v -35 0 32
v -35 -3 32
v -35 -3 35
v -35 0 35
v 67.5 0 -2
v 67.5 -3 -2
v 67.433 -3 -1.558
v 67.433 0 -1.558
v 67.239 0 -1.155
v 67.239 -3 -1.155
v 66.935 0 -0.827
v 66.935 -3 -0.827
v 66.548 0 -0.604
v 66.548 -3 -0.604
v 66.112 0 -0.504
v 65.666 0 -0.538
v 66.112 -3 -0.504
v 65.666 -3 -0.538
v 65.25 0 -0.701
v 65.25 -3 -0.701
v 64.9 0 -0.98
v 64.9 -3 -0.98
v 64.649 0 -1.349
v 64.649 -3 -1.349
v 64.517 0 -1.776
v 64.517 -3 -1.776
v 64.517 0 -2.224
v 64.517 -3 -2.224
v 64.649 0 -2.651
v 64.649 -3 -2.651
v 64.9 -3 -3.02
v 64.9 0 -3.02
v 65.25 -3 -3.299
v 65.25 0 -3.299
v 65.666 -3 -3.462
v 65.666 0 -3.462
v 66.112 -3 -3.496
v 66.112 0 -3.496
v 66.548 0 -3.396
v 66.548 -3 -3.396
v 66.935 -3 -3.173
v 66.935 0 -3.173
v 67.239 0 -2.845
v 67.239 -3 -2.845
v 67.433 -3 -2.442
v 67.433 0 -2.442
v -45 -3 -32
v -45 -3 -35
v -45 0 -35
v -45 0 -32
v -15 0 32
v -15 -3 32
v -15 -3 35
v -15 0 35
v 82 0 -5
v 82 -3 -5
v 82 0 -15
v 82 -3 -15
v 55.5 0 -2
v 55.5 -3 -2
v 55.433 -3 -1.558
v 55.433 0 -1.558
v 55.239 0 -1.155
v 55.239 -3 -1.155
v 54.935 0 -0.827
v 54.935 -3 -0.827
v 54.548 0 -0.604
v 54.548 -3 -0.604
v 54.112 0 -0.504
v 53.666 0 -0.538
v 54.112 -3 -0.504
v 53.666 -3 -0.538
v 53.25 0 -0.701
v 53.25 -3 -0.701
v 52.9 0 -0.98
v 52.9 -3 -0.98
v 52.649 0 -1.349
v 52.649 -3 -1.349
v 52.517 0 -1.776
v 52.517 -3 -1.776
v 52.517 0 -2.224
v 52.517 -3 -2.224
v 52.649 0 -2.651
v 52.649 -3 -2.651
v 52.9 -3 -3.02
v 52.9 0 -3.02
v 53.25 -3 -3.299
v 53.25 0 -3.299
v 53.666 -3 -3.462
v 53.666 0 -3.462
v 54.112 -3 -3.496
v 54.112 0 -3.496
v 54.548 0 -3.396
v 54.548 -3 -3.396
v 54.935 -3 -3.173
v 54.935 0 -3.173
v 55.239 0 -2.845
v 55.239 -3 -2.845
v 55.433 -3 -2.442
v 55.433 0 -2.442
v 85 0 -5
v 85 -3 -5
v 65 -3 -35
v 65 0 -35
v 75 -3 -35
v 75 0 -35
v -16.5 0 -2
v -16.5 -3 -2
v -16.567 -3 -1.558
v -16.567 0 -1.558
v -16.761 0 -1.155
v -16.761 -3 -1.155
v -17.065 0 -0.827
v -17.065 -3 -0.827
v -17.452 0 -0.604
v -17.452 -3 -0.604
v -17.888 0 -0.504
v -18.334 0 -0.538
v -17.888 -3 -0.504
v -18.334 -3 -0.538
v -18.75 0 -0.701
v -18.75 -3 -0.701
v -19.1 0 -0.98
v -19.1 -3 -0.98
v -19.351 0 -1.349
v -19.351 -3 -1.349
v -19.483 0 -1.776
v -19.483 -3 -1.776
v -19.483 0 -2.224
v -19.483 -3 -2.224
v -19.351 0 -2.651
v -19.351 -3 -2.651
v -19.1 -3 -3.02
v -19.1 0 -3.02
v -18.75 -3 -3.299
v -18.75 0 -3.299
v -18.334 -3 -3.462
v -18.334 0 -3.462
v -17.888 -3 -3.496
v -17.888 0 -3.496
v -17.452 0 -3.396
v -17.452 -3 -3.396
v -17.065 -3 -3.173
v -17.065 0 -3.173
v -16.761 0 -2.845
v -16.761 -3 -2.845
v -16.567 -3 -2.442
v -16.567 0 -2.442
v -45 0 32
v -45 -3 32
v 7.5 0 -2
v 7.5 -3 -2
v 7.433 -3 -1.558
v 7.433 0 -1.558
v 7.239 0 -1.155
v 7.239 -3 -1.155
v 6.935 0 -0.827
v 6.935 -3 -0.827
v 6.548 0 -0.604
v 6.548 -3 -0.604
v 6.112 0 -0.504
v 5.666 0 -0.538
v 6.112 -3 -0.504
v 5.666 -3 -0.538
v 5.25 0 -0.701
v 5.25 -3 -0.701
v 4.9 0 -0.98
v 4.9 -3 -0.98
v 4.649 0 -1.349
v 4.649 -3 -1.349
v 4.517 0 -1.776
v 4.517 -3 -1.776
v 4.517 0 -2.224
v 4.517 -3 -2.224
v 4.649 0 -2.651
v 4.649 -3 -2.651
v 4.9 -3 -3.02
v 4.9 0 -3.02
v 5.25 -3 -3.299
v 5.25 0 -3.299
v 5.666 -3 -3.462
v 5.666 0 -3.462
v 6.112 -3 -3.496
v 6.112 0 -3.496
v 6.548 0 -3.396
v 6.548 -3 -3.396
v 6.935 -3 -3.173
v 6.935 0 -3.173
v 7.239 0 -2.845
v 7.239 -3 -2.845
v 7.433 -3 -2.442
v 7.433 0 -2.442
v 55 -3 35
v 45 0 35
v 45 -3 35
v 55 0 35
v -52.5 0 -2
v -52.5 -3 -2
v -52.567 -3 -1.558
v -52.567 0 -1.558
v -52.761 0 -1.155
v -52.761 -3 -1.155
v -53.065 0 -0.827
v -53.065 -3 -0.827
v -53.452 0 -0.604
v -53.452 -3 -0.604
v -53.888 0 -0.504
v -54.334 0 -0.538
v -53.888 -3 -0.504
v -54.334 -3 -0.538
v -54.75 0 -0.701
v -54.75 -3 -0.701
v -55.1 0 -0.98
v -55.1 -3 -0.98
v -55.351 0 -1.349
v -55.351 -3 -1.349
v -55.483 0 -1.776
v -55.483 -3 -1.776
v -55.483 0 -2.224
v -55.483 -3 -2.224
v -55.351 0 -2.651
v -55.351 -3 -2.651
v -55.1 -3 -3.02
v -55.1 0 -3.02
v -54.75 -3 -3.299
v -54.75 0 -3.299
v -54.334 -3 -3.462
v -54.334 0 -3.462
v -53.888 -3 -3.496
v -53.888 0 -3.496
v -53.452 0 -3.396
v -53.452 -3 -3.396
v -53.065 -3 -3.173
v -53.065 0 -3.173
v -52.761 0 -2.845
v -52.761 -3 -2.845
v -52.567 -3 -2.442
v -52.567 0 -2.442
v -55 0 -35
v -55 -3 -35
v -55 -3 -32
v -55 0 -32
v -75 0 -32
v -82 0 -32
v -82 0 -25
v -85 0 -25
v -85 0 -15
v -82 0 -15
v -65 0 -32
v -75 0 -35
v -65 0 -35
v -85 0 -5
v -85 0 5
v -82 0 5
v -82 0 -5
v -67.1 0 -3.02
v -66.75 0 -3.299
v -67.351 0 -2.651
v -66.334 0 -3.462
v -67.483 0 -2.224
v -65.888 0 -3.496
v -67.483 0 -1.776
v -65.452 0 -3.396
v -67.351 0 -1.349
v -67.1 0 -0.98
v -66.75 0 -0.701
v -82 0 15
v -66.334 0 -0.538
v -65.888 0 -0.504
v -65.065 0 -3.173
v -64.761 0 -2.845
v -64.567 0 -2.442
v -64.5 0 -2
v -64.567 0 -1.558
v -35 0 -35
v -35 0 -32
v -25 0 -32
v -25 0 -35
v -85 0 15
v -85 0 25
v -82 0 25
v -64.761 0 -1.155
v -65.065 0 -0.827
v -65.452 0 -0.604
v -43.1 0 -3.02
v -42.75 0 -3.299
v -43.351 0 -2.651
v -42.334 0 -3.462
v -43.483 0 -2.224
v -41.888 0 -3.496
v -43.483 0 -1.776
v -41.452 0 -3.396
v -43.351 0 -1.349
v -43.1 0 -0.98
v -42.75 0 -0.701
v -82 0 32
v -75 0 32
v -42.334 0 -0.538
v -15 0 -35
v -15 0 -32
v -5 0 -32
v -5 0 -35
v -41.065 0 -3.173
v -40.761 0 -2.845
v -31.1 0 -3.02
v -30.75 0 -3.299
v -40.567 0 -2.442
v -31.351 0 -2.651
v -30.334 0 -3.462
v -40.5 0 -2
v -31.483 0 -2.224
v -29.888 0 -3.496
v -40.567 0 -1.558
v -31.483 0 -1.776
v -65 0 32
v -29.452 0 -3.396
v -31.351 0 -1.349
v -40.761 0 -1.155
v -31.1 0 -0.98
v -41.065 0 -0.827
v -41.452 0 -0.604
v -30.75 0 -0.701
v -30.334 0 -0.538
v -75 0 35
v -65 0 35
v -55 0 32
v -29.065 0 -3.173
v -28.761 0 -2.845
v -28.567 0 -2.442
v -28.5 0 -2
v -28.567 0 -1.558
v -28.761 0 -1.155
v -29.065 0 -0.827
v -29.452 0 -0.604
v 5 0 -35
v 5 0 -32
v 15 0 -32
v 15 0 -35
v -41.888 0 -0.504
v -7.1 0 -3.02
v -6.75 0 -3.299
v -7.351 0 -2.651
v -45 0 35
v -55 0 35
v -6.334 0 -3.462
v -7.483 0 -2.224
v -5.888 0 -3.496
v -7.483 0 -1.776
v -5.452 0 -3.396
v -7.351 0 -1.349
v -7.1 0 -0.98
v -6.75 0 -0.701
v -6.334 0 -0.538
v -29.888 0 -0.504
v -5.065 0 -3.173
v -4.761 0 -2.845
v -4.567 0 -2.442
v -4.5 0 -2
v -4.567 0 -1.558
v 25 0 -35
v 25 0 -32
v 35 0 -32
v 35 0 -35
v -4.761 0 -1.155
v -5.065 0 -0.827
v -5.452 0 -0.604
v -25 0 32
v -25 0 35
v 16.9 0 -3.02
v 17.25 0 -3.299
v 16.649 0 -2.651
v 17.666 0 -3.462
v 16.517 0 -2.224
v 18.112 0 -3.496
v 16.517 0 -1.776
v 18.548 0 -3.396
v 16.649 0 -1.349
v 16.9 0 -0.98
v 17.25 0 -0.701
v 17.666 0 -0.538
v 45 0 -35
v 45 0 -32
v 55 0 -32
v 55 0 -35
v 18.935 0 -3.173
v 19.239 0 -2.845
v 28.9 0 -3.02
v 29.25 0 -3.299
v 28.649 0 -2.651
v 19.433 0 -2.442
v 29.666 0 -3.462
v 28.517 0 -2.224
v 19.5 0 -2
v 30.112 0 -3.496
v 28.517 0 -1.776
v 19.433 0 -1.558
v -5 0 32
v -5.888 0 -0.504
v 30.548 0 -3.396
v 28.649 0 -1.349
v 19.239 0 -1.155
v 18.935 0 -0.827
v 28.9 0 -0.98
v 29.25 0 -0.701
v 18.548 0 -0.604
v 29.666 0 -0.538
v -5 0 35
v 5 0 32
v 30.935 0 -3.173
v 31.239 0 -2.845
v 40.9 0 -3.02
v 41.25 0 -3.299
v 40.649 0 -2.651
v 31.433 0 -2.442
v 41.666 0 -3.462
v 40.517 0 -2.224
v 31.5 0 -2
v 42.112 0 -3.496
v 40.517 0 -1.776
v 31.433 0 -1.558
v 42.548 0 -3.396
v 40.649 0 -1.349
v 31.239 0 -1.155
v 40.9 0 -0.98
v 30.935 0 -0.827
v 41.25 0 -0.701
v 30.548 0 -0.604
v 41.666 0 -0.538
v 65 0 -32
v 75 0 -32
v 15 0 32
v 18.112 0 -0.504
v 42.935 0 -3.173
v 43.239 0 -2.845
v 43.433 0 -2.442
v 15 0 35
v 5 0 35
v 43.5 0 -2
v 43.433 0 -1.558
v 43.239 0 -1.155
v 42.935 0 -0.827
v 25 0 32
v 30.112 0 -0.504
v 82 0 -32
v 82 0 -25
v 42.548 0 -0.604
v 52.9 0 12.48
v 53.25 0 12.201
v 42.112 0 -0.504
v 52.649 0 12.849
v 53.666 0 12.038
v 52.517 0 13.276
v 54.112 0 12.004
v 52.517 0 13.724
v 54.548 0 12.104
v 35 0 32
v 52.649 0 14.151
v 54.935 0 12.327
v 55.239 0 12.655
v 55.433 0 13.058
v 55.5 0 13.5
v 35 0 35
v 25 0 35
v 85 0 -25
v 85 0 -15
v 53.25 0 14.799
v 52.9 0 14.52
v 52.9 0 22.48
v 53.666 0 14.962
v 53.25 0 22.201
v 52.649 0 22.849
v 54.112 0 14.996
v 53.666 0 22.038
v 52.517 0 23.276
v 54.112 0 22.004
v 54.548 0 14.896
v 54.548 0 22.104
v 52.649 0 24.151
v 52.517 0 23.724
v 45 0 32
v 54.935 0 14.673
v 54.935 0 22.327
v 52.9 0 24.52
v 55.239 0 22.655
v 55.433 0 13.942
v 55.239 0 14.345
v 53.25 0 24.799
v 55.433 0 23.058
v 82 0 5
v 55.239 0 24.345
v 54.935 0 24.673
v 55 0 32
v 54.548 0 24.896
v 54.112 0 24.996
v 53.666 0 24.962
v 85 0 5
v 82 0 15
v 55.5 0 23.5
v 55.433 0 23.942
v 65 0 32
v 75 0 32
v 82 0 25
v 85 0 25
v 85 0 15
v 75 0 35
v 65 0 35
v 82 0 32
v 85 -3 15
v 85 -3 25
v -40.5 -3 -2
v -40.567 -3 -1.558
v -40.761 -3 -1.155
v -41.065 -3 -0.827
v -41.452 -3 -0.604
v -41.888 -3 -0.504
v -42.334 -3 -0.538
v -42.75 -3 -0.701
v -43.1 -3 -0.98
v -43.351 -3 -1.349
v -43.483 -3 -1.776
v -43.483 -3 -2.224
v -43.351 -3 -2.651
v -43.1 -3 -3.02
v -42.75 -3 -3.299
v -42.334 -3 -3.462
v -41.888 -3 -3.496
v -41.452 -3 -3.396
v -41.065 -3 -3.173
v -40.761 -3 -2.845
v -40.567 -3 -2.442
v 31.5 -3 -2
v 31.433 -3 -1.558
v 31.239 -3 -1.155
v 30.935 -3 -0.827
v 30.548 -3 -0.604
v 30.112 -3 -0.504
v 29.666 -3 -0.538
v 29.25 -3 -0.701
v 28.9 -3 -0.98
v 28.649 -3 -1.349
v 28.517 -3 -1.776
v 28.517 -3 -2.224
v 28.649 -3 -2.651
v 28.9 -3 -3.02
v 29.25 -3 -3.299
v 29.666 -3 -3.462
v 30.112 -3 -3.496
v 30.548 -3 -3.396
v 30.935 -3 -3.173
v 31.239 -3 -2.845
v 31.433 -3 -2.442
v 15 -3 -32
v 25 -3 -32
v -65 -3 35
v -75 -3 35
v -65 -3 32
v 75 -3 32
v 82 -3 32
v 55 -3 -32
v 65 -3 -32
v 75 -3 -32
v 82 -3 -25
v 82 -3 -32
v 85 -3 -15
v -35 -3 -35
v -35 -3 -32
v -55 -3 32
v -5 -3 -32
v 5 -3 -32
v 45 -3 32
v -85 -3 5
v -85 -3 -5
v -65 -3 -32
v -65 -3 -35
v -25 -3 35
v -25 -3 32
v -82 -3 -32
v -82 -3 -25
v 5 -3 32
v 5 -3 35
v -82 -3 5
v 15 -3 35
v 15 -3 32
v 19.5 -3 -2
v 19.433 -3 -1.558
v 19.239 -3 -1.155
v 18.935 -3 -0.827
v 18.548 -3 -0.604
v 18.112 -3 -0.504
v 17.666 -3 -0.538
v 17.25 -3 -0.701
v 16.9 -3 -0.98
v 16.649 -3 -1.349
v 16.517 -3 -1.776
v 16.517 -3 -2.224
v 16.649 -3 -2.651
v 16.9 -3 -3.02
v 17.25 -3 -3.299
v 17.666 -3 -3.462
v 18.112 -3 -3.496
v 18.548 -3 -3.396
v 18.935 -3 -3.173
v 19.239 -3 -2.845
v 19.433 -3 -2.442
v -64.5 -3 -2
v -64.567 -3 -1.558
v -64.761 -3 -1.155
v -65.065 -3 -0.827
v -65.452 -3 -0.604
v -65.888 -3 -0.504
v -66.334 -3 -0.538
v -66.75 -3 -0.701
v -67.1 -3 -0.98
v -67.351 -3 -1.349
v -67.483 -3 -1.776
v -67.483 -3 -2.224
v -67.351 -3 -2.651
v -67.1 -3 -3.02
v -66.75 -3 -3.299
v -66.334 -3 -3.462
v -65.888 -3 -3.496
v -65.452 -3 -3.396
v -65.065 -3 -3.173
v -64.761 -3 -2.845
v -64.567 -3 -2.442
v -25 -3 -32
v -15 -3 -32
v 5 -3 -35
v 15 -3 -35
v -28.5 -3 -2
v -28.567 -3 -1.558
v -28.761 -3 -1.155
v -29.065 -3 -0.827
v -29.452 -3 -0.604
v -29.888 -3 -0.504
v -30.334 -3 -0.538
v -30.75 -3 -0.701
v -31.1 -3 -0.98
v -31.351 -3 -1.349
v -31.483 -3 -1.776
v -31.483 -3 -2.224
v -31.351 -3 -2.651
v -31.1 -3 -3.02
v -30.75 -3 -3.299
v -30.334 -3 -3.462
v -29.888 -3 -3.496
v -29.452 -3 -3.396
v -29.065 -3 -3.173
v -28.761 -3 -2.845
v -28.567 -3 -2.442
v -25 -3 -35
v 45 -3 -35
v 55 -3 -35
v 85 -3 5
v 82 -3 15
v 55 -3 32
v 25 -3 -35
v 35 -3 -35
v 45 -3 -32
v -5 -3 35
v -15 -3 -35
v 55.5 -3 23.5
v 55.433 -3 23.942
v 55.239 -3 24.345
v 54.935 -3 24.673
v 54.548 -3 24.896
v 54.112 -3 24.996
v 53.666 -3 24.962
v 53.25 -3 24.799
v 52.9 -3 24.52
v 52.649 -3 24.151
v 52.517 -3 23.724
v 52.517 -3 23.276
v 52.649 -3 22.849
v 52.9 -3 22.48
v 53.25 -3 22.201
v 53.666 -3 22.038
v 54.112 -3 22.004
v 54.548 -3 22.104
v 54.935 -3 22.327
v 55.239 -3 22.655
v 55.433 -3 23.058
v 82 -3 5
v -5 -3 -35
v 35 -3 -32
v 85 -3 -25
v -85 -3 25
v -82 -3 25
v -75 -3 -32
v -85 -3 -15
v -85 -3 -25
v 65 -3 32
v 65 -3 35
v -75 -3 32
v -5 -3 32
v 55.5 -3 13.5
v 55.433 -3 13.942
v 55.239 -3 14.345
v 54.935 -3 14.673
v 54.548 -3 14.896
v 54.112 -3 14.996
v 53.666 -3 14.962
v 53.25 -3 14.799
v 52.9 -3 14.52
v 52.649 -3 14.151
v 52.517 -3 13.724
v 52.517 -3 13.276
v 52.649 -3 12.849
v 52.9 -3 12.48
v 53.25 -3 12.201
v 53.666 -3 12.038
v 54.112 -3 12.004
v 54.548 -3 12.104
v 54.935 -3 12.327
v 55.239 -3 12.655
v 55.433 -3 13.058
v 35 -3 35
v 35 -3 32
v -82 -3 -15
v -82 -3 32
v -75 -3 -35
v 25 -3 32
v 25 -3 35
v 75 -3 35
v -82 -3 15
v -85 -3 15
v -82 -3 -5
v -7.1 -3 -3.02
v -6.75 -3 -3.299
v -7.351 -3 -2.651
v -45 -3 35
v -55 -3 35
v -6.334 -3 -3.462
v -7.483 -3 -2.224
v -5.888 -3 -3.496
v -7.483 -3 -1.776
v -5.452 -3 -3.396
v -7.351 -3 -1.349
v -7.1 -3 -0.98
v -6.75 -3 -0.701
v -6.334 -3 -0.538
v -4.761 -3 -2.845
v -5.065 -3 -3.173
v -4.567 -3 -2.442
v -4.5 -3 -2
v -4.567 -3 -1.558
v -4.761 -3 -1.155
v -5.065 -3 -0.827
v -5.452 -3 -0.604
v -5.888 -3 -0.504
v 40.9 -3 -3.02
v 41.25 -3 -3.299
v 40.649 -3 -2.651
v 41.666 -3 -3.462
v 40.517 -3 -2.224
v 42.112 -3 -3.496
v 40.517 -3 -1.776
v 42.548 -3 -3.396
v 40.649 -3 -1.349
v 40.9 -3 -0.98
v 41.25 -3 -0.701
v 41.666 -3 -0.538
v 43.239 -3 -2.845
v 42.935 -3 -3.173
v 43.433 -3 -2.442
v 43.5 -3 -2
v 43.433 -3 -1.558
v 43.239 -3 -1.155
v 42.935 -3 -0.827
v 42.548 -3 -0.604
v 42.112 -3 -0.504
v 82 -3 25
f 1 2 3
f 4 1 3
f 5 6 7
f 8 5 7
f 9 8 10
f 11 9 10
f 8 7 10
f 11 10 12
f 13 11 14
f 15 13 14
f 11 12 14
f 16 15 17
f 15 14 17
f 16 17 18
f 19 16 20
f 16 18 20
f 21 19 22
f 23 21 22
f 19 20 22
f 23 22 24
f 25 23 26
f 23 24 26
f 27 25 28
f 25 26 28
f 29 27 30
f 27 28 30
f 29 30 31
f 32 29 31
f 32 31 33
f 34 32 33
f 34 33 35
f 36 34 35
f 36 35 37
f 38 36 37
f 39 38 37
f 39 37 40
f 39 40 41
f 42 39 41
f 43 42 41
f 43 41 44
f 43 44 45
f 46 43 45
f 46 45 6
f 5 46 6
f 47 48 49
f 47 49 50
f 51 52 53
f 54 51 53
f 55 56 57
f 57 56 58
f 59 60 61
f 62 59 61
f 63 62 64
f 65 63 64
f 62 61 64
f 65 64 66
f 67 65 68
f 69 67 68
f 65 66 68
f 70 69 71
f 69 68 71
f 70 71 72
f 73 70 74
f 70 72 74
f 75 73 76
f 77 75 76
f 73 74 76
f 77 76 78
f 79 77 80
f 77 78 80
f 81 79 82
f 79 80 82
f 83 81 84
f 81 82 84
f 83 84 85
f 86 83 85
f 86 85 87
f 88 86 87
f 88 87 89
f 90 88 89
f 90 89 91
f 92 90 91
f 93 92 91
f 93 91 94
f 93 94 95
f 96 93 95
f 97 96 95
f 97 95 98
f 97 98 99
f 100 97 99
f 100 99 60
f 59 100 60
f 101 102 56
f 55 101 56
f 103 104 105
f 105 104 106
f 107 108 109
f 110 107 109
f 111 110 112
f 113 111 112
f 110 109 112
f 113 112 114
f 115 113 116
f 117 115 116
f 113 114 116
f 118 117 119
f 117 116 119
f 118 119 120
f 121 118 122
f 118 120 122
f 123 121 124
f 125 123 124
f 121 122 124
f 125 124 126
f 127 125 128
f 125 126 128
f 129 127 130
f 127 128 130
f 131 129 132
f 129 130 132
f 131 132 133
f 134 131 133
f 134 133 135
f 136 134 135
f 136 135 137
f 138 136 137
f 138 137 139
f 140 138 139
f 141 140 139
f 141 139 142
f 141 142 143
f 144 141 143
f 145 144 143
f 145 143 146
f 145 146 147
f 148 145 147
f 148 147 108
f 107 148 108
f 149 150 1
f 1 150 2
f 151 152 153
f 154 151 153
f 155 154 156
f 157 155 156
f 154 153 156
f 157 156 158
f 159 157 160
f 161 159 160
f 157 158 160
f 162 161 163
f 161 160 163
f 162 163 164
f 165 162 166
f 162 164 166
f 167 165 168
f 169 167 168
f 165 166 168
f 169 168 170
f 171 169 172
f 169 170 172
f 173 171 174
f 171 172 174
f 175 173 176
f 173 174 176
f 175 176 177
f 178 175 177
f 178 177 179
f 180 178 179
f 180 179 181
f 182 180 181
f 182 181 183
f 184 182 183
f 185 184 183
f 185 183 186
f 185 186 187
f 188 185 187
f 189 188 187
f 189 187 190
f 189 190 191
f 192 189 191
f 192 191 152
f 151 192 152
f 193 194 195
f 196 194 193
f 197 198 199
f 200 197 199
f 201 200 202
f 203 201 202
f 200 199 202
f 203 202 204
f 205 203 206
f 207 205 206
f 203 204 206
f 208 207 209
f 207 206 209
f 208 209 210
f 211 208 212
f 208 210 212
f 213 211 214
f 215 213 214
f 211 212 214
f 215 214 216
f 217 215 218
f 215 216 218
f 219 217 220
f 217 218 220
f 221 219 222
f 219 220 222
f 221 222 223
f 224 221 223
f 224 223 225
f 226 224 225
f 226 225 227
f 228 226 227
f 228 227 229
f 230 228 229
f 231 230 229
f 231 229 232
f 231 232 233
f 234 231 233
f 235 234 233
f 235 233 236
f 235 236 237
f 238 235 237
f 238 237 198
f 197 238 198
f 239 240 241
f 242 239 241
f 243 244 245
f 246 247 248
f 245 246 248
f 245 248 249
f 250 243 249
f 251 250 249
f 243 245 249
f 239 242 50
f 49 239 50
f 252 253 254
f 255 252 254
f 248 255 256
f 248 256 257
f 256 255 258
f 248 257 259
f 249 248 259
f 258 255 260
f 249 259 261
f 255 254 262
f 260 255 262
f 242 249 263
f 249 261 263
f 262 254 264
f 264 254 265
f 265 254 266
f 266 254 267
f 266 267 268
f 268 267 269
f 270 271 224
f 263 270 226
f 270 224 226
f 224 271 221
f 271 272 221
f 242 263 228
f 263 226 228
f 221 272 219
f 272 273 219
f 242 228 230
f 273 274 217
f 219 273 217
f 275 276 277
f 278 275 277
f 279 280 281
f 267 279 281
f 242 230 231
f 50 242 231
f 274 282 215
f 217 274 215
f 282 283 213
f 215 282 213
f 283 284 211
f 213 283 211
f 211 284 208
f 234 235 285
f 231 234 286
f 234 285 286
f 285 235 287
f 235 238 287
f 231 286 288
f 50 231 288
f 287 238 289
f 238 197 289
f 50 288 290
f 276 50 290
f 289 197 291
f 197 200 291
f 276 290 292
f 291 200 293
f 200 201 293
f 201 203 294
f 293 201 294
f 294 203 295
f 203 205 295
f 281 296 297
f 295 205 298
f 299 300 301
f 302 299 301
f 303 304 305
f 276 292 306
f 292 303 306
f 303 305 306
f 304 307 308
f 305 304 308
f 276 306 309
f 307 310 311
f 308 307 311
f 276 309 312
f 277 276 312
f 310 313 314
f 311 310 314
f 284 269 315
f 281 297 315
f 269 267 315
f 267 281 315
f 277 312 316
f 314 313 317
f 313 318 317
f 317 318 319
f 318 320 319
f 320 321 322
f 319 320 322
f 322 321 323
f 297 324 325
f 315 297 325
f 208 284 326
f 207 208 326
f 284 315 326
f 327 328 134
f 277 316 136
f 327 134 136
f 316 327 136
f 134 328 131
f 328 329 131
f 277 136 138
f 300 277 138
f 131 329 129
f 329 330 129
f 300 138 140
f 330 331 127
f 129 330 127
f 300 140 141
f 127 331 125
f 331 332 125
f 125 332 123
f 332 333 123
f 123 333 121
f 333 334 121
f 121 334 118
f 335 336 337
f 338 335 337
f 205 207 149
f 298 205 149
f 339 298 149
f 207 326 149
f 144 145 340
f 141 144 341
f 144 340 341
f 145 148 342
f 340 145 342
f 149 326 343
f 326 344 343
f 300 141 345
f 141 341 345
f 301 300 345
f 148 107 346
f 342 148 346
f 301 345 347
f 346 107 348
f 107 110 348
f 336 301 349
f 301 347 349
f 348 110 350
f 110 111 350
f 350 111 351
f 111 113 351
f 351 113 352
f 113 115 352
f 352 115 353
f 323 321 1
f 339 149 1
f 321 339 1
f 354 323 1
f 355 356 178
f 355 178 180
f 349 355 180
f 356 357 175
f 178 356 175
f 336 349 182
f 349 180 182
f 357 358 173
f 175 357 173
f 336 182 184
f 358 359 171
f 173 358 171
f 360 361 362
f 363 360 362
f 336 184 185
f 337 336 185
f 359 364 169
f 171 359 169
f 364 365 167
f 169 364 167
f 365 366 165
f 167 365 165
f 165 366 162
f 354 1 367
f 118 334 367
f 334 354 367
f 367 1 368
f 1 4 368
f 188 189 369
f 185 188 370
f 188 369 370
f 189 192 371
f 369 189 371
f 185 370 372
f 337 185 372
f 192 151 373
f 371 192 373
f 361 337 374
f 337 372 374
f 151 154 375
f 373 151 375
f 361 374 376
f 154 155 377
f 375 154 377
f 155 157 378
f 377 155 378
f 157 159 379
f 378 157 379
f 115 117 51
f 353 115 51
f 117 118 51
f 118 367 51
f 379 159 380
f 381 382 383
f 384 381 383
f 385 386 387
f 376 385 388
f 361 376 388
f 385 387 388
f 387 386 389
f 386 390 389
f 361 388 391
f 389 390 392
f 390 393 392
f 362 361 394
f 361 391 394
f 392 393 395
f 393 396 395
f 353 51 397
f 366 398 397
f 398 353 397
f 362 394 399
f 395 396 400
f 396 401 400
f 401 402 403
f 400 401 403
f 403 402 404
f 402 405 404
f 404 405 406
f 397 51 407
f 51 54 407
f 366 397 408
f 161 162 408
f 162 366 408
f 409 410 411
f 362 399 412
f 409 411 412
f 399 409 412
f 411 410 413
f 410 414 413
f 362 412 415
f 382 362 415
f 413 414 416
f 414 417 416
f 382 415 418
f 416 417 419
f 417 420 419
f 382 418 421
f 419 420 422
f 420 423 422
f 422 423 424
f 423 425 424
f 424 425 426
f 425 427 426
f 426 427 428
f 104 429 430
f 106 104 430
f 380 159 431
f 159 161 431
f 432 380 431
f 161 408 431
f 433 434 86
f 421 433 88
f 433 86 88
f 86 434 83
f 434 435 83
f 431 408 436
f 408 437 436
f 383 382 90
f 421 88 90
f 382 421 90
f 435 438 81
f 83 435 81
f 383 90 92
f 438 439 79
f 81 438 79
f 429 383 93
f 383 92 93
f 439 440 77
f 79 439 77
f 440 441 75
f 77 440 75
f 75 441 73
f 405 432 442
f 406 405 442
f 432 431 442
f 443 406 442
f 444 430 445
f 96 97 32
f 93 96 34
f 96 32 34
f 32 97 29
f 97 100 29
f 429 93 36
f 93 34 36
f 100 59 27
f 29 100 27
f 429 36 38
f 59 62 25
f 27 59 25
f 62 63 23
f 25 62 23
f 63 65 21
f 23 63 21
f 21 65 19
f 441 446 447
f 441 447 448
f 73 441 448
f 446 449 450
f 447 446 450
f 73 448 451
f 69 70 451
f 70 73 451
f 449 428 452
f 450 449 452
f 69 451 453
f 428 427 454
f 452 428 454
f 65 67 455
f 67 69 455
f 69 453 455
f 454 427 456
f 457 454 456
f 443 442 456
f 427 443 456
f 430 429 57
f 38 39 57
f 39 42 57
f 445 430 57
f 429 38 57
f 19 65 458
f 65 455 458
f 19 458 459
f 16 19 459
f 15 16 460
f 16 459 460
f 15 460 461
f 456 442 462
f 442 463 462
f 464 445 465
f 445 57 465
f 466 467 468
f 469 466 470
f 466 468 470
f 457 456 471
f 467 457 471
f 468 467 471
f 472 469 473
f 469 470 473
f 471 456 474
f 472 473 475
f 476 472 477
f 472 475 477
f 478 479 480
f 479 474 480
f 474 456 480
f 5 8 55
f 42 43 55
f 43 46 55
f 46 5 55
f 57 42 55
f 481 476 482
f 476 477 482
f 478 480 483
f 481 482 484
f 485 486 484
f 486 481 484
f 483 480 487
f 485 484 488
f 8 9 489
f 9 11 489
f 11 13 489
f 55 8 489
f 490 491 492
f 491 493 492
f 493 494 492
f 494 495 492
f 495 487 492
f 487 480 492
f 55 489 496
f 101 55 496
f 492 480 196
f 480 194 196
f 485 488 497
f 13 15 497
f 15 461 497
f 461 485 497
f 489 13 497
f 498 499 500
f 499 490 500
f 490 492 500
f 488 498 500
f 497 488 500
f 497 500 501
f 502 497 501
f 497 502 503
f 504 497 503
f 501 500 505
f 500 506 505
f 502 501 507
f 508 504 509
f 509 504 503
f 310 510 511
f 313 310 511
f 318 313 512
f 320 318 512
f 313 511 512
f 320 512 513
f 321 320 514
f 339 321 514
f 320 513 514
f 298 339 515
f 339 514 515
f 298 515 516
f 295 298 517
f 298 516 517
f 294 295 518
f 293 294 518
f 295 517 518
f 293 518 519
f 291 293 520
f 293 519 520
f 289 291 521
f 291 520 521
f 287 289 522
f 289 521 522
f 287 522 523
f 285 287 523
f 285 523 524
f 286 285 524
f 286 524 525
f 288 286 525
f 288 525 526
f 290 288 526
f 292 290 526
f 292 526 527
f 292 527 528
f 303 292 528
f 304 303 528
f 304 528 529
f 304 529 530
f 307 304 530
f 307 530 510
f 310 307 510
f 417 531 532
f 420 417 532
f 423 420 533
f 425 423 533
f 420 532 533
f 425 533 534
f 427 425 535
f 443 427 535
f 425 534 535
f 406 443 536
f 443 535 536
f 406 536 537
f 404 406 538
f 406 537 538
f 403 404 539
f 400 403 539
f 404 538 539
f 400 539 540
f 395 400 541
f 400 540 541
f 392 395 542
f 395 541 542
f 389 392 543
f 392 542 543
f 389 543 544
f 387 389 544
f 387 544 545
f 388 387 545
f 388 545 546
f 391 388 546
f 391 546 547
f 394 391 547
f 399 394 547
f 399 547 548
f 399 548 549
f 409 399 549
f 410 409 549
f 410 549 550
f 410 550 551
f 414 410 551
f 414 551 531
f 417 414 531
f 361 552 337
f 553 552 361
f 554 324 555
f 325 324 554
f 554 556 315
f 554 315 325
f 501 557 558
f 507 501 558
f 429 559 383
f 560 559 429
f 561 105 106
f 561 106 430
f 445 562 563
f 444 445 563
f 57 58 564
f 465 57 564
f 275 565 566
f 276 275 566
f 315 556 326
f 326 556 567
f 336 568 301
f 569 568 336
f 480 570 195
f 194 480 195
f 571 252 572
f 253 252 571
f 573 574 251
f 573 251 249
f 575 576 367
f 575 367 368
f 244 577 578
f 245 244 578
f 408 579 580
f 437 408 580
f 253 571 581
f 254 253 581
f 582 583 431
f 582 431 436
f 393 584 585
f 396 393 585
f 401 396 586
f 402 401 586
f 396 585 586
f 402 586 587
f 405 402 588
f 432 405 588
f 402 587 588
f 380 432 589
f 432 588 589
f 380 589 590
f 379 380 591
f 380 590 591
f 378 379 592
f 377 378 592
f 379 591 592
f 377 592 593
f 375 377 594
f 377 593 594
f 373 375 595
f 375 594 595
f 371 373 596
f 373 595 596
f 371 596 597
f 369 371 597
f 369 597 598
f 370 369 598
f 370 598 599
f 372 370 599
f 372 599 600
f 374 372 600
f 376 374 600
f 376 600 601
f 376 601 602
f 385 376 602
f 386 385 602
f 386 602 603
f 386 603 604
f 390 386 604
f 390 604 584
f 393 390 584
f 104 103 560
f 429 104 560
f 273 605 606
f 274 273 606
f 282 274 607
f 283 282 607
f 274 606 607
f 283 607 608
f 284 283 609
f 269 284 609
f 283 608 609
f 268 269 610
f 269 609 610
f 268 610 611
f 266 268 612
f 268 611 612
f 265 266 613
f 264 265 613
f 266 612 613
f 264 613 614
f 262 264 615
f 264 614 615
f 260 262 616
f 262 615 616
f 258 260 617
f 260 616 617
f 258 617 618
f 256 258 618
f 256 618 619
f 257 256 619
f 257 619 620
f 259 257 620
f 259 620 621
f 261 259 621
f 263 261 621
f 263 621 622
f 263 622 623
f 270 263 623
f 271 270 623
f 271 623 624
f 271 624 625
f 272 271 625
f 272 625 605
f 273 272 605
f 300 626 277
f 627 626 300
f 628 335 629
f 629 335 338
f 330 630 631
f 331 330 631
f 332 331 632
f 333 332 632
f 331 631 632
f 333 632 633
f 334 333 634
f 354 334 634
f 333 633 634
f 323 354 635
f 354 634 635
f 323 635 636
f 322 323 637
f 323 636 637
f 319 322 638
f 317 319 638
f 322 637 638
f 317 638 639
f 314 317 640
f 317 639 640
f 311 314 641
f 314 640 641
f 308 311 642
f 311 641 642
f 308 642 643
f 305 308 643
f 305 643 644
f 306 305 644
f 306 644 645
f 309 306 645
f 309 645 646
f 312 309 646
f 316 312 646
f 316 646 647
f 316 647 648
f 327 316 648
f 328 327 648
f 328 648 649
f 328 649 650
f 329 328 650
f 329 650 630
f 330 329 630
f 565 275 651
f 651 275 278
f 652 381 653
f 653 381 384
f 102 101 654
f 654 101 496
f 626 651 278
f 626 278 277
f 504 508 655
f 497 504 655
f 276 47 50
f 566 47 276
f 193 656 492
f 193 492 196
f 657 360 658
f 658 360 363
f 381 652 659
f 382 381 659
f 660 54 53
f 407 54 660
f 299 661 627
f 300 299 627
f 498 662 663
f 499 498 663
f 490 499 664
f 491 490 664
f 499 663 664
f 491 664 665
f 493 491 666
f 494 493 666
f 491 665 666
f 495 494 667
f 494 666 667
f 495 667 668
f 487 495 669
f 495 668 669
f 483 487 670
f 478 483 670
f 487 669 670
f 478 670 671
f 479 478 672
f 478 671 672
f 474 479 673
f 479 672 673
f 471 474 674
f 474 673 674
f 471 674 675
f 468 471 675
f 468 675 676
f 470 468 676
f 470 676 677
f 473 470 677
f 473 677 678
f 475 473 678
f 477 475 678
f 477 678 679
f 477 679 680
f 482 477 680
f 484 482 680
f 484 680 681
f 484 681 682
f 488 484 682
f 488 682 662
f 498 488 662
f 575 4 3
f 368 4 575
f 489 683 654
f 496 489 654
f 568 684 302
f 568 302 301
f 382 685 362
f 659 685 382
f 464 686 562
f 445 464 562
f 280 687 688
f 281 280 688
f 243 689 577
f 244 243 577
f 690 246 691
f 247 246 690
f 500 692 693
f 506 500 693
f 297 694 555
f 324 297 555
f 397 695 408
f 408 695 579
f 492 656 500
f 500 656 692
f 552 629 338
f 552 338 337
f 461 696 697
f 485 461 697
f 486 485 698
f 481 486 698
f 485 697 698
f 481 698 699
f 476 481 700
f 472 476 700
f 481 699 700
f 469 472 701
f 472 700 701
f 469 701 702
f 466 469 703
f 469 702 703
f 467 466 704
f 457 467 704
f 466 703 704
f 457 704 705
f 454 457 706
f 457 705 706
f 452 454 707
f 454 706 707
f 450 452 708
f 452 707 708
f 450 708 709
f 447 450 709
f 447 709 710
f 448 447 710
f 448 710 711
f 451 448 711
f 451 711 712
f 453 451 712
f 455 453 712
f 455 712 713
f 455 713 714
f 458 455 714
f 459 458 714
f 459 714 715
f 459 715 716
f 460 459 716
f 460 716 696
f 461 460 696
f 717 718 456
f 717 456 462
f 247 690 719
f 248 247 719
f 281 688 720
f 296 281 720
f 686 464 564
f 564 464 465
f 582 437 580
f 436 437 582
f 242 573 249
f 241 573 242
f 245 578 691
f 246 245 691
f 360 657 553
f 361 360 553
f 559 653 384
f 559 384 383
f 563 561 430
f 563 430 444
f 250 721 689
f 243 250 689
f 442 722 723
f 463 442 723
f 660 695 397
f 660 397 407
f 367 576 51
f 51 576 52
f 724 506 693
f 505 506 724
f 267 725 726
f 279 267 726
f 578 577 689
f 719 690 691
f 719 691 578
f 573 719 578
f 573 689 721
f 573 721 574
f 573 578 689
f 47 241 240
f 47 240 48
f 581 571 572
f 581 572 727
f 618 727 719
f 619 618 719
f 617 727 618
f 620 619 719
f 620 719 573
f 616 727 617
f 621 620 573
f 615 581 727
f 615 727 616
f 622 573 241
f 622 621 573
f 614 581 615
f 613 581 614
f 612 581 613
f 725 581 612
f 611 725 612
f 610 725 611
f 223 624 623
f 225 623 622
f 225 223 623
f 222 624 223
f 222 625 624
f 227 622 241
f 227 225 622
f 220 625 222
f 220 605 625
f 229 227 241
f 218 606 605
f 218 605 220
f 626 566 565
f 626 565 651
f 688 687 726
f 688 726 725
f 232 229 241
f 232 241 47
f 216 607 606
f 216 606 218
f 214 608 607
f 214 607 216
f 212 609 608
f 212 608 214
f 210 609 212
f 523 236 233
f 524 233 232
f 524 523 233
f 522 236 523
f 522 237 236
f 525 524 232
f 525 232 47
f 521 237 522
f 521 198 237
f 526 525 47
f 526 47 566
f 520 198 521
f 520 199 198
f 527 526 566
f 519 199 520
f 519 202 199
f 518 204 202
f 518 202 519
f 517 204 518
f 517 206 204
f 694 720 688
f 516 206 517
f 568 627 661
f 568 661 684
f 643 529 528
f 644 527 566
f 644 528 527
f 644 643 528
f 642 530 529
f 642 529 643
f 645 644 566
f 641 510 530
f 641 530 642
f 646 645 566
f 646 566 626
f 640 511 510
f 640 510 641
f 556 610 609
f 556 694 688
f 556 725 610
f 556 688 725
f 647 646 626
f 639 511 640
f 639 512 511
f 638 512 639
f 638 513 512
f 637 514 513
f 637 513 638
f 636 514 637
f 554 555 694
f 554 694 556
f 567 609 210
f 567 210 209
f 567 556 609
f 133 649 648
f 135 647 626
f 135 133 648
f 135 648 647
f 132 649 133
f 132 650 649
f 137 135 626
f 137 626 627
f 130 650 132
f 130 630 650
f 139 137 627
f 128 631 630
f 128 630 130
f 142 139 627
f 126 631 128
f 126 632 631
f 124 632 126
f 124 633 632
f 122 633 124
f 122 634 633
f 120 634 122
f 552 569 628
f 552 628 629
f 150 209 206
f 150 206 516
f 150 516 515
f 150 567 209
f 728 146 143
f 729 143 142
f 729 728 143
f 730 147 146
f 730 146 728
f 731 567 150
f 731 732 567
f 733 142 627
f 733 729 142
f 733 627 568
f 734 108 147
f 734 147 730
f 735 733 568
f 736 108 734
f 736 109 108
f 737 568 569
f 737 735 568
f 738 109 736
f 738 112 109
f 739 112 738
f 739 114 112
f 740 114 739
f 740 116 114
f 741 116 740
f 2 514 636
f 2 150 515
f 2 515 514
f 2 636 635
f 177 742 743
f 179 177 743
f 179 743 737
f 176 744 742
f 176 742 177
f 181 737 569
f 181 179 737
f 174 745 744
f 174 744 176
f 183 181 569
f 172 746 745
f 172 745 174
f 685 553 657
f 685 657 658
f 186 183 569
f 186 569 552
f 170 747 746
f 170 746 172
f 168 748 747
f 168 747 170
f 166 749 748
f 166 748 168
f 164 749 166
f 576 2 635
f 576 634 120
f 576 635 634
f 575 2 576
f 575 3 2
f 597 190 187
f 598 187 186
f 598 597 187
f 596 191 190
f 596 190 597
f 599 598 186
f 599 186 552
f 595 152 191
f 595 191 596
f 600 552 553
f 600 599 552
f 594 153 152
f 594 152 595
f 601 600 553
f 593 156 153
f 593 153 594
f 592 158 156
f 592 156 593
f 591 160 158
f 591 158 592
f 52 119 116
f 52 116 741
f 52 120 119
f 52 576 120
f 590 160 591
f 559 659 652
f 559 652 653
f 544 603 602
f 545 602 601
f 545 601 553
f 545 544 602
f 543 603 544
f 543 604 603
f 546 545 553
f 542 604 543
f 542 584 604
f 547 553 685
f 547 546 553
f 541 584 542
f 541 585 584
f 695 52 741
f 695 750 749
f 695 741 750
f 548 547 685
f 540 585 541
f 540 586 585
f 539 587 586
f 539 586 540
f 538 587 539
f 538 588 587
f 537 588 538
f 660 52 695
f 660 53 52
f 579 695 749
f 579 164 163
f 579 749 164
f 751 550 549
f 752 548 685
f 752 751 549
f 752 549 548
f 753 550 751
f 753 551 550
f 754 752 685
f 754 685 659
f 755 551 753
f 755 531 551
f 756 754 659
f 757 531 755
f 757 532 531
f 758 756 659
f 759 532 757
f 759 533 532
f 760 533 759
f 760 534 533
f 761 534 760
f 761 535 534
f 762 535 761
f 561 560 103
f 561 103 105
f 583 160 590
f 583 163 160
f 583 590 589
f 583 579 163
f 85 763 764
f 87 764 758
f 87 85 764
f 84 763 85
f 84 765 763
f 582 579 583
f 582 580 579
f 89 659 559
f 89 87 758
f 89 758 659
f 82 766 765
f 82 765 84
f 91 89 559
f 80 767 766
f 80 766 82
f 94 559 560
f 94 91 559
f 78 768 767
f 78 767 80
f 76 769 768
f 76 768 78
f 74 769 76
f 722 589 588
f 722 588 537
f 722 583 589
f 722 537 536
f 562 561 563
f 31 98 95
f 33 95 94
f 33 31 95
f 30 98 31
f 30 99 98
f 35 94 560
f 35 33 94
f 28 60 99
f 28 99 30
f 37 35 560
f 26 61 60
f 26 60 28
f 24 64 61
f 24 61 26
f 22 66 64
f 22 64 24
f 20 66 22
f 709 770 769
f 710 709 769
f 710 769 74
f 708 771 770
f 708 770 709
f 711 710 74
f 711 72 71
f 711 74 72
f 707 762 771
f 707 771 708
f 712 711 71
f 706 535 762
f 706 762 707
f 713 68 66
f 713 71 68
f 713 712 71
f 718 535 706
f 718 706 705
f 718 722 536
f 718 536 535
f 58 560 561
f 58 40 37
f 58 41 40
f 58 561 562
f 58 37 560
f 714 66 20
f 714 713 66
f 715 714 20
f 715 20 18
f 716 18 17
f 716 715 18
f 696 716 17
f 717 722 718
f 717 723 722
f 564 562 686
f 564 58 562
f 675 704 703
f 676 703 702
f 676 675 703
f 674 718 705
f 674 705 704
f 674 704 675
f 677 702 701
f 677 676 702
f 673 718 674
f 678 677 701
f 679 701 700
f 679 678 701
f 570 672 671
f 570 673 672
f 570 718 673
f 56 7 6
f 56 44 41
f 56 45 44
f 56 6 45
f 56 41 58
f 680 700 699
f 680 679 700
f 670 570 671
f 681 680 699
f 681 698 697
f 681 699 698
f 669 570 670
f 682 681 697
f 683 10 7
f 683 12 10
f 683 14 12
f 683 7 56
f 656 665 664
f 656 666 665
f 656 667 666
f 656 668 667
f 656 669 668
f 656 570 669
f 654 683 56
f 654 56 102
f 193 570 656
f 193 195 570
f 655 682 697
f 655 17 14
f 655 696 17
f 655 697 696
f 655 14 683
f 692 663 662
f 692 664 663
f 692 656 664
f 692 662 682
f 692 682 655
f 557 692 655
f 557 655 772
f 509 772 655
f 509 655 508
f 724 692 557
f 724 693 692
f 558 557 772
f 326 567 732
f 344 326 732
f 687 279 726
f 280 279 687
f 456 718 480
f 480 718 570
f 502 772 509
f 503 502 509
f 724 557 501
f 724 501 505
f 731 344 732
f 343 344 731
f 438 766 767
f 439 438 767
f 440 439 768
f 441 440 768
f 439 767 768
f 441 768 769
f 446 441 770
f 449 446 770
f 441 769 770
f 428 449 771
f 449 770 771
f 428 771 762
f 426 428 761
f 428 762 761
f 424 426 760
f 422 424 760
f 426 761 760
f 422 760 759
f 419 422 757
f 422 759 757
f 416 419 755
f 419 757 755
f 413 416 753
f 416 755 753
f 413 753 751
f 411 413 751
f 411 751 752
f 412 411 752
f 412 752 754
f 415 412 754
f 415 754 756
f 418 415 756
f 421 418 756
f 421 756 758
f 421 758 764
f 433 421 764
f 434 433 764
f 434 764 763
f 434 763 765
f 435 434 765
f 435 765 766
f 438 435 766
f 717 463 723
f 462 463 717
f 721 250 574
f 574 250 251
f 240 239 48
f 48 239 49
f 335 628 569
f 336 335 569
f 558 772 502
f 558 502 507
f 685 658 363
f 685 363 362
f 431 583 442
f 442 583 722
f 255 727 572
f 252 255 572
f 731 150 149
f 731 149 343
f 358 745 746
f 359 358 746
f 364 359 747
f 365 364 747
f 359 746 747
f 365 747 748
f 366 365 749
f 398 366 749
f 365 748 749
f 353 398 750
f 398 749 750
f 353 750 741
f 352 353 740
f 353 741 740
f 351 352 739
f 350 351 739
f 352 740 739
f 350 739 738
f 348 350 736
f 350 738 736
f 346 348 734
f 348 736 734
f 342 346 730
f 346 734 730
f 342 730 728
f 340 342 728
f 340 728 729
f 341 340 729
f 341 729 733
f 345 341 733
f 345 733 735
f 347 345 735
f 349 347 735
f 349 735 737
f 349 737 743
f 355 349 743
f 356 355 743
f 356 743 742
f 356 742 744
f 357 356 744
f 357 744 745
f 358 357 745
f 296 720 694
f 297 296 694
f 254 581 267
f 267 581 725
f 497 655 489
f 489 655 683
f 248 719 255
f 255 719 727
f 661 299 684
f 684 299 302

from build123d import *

# Parameters (mm, degrees)
F0_W     = 170
F0_H     = 70
F1_DEPTH = 3
F2_R     = 1.5
F3_DEPTH = 3.001
F4_R     = 1.5
F5_DEPTH = 3.001
F6_W     = 3
F6_H     = 3
F6_W_2   = 7
F6_W_3   = 10
F6_H_2   = 7
F7_DEPTH = 3.001


with BuildPart() as f1:
    # F0 (on Front) → F1 (new body)
    with BuildSketch(Plane.XZ):
        Rectangle(F0_W, F0_H)
    extrude(amount=F1_DEPTH)

    # F2 (on face) → F3 (cut, through all)
    with BuildSketch(Plane.XZ.offset(3)):
        with Locations((-66, -2)):
            Circle(F2_R)
        with Locations((-54, -2)):
            Circle(F2_R)
        with Locations((-42, -2)):
            Circle(F2_R)
        with Locations((-30, -2)):
            Circle(F2_R)
        with Locations((-18, -2)):
            Circle(F2_R)
        with Locations((-6, -2)):
            Circle(F2_R)
        with Locations((6, -2)):
            Circle(F2_R)
        with Locations((18, -2)):
            Circle(F2_R)
        with Locations((30, -2)):
            Circle(F2_R)
        with Locations((42, -2)):
            Circle(F2_R)
        with Locations((54, -2)):
            Circle(F2_R)
        with Locations((66, -2)):
            Circle(F2_R)
    extrude(amount=-F3_DEPTH, mode=Mode.SUBTRACT)

    # F4 (on face) → F5 (cut, through all)
    with BuildSketch(Plane.XZ.offset(3)):
        with Locations((54, 13.5)):
            Circle(F4_R)
        with Locations((54, 23.5)):
            Circle(F4_R)
    extrude(amount=-F5_DEPTH, mode=Mode.SUBTRACT)

    # F6 (on face) → F7 (cut, through all)
    with BuildSketch(Plane.XZ.offset(3)):
        with Locations((-83.5, -33.5)):
            Rectangle(F6_W, F6_H)
        with Locations((-78.5, -33.5)):
            Rectangle(F6_W_2, F6_H)
        Polygon((-85, -28), (-85, -32), (-82, -32), (-82, -25), (-85, -25), align=None)
        with Locations((-60, -33.5)):
            Rectangle(F6_W_3, F6_H)
        with Locations((-40, -33.5)):
            Rectangle(F6_W_3, F6_H)
        with Locations((-20, -33.5)):
            Rectangle(F6_W_3, F6_H)
        with Locations((0, -33.5)):
            Rectangle(F6_W_3, F6_H)
        with Locations((20, -33.5)):
            Rectangle(F6_W_3, F6_H)
        with Locations((40, -33.5)):
            Rectangle(F6_W_3, F6_H)
        with Locations((60, -33.5)):
            Rectangle(F6_W_3, F6_H)
        with Locations((83.5, -33.5)):
            Rectangle(F6_W, F6_H)
        Polygon((82, -32), (85, -32), (85, -28), (85, -25), (82, -25), align=None)
        with Locations((78.5, -33.5)):
            Rectangle(F6_W_2, F6_H)
        with Locations((-60, 33.5)):
            Rectangle(F6_W_3, F6_H)
        with Locations((-20, 33.5)):
            Rectangle(F6_W_3, F6_H)
        with Locations((-40, 33.5)):
            Rectangle(F6_W_3, F6_H)
        with Locations((0, 33.5)):
            Rectangle(F6_W_3, F6_H)
        with Locations((-83.5, 33.5)):
            Rectangle(F6_W, F6_H)
        with Locations((-83.5, 28.5)):
            Rectangle(F6_W, F6_H_2)
        with Locations((-78.5, 33.5)):
            Rectangle(F6_W_2, F6_H)
        with Locations((78.5, 33.5)):
            Rectangle(F6_W_2, F6_H)
        with Locations((83.5, 33.5)):
            Rectangle(F6_W, F6_H)
        with Locations((83.5, 28.5)):
            Rectangle(F6_W, F6_H_2)
        with Locations((20, 33.5)):
            Rectangle(F6_W_3, F6_H)
        with Locations((40, 33.5)):
            Rectangle(F6_W_3, F6_H)
        with Locations((60, 33.5)):
            Rectangle(F6_W_3, F6_H)
        Polygon((-82, 5), (-82, 15), (-85, 15), (-85, 12), (-85, 5), align=None)
        Polygon((-82, -15), (-82, -5), (-85, -5), (-85, -8), (-85, -15), align=None)
        Polygon((85, 12), (85, 15), (82, 15), (82, 5), (85, 5), align=None)
        Polygon((85, -8), (85, -5), (82, -5), (82, -15), (85, -15), align=None)
    extrude(amount=-F7_DEPTH, mode=Mode.SUBTRACT)


solid = f1.part
